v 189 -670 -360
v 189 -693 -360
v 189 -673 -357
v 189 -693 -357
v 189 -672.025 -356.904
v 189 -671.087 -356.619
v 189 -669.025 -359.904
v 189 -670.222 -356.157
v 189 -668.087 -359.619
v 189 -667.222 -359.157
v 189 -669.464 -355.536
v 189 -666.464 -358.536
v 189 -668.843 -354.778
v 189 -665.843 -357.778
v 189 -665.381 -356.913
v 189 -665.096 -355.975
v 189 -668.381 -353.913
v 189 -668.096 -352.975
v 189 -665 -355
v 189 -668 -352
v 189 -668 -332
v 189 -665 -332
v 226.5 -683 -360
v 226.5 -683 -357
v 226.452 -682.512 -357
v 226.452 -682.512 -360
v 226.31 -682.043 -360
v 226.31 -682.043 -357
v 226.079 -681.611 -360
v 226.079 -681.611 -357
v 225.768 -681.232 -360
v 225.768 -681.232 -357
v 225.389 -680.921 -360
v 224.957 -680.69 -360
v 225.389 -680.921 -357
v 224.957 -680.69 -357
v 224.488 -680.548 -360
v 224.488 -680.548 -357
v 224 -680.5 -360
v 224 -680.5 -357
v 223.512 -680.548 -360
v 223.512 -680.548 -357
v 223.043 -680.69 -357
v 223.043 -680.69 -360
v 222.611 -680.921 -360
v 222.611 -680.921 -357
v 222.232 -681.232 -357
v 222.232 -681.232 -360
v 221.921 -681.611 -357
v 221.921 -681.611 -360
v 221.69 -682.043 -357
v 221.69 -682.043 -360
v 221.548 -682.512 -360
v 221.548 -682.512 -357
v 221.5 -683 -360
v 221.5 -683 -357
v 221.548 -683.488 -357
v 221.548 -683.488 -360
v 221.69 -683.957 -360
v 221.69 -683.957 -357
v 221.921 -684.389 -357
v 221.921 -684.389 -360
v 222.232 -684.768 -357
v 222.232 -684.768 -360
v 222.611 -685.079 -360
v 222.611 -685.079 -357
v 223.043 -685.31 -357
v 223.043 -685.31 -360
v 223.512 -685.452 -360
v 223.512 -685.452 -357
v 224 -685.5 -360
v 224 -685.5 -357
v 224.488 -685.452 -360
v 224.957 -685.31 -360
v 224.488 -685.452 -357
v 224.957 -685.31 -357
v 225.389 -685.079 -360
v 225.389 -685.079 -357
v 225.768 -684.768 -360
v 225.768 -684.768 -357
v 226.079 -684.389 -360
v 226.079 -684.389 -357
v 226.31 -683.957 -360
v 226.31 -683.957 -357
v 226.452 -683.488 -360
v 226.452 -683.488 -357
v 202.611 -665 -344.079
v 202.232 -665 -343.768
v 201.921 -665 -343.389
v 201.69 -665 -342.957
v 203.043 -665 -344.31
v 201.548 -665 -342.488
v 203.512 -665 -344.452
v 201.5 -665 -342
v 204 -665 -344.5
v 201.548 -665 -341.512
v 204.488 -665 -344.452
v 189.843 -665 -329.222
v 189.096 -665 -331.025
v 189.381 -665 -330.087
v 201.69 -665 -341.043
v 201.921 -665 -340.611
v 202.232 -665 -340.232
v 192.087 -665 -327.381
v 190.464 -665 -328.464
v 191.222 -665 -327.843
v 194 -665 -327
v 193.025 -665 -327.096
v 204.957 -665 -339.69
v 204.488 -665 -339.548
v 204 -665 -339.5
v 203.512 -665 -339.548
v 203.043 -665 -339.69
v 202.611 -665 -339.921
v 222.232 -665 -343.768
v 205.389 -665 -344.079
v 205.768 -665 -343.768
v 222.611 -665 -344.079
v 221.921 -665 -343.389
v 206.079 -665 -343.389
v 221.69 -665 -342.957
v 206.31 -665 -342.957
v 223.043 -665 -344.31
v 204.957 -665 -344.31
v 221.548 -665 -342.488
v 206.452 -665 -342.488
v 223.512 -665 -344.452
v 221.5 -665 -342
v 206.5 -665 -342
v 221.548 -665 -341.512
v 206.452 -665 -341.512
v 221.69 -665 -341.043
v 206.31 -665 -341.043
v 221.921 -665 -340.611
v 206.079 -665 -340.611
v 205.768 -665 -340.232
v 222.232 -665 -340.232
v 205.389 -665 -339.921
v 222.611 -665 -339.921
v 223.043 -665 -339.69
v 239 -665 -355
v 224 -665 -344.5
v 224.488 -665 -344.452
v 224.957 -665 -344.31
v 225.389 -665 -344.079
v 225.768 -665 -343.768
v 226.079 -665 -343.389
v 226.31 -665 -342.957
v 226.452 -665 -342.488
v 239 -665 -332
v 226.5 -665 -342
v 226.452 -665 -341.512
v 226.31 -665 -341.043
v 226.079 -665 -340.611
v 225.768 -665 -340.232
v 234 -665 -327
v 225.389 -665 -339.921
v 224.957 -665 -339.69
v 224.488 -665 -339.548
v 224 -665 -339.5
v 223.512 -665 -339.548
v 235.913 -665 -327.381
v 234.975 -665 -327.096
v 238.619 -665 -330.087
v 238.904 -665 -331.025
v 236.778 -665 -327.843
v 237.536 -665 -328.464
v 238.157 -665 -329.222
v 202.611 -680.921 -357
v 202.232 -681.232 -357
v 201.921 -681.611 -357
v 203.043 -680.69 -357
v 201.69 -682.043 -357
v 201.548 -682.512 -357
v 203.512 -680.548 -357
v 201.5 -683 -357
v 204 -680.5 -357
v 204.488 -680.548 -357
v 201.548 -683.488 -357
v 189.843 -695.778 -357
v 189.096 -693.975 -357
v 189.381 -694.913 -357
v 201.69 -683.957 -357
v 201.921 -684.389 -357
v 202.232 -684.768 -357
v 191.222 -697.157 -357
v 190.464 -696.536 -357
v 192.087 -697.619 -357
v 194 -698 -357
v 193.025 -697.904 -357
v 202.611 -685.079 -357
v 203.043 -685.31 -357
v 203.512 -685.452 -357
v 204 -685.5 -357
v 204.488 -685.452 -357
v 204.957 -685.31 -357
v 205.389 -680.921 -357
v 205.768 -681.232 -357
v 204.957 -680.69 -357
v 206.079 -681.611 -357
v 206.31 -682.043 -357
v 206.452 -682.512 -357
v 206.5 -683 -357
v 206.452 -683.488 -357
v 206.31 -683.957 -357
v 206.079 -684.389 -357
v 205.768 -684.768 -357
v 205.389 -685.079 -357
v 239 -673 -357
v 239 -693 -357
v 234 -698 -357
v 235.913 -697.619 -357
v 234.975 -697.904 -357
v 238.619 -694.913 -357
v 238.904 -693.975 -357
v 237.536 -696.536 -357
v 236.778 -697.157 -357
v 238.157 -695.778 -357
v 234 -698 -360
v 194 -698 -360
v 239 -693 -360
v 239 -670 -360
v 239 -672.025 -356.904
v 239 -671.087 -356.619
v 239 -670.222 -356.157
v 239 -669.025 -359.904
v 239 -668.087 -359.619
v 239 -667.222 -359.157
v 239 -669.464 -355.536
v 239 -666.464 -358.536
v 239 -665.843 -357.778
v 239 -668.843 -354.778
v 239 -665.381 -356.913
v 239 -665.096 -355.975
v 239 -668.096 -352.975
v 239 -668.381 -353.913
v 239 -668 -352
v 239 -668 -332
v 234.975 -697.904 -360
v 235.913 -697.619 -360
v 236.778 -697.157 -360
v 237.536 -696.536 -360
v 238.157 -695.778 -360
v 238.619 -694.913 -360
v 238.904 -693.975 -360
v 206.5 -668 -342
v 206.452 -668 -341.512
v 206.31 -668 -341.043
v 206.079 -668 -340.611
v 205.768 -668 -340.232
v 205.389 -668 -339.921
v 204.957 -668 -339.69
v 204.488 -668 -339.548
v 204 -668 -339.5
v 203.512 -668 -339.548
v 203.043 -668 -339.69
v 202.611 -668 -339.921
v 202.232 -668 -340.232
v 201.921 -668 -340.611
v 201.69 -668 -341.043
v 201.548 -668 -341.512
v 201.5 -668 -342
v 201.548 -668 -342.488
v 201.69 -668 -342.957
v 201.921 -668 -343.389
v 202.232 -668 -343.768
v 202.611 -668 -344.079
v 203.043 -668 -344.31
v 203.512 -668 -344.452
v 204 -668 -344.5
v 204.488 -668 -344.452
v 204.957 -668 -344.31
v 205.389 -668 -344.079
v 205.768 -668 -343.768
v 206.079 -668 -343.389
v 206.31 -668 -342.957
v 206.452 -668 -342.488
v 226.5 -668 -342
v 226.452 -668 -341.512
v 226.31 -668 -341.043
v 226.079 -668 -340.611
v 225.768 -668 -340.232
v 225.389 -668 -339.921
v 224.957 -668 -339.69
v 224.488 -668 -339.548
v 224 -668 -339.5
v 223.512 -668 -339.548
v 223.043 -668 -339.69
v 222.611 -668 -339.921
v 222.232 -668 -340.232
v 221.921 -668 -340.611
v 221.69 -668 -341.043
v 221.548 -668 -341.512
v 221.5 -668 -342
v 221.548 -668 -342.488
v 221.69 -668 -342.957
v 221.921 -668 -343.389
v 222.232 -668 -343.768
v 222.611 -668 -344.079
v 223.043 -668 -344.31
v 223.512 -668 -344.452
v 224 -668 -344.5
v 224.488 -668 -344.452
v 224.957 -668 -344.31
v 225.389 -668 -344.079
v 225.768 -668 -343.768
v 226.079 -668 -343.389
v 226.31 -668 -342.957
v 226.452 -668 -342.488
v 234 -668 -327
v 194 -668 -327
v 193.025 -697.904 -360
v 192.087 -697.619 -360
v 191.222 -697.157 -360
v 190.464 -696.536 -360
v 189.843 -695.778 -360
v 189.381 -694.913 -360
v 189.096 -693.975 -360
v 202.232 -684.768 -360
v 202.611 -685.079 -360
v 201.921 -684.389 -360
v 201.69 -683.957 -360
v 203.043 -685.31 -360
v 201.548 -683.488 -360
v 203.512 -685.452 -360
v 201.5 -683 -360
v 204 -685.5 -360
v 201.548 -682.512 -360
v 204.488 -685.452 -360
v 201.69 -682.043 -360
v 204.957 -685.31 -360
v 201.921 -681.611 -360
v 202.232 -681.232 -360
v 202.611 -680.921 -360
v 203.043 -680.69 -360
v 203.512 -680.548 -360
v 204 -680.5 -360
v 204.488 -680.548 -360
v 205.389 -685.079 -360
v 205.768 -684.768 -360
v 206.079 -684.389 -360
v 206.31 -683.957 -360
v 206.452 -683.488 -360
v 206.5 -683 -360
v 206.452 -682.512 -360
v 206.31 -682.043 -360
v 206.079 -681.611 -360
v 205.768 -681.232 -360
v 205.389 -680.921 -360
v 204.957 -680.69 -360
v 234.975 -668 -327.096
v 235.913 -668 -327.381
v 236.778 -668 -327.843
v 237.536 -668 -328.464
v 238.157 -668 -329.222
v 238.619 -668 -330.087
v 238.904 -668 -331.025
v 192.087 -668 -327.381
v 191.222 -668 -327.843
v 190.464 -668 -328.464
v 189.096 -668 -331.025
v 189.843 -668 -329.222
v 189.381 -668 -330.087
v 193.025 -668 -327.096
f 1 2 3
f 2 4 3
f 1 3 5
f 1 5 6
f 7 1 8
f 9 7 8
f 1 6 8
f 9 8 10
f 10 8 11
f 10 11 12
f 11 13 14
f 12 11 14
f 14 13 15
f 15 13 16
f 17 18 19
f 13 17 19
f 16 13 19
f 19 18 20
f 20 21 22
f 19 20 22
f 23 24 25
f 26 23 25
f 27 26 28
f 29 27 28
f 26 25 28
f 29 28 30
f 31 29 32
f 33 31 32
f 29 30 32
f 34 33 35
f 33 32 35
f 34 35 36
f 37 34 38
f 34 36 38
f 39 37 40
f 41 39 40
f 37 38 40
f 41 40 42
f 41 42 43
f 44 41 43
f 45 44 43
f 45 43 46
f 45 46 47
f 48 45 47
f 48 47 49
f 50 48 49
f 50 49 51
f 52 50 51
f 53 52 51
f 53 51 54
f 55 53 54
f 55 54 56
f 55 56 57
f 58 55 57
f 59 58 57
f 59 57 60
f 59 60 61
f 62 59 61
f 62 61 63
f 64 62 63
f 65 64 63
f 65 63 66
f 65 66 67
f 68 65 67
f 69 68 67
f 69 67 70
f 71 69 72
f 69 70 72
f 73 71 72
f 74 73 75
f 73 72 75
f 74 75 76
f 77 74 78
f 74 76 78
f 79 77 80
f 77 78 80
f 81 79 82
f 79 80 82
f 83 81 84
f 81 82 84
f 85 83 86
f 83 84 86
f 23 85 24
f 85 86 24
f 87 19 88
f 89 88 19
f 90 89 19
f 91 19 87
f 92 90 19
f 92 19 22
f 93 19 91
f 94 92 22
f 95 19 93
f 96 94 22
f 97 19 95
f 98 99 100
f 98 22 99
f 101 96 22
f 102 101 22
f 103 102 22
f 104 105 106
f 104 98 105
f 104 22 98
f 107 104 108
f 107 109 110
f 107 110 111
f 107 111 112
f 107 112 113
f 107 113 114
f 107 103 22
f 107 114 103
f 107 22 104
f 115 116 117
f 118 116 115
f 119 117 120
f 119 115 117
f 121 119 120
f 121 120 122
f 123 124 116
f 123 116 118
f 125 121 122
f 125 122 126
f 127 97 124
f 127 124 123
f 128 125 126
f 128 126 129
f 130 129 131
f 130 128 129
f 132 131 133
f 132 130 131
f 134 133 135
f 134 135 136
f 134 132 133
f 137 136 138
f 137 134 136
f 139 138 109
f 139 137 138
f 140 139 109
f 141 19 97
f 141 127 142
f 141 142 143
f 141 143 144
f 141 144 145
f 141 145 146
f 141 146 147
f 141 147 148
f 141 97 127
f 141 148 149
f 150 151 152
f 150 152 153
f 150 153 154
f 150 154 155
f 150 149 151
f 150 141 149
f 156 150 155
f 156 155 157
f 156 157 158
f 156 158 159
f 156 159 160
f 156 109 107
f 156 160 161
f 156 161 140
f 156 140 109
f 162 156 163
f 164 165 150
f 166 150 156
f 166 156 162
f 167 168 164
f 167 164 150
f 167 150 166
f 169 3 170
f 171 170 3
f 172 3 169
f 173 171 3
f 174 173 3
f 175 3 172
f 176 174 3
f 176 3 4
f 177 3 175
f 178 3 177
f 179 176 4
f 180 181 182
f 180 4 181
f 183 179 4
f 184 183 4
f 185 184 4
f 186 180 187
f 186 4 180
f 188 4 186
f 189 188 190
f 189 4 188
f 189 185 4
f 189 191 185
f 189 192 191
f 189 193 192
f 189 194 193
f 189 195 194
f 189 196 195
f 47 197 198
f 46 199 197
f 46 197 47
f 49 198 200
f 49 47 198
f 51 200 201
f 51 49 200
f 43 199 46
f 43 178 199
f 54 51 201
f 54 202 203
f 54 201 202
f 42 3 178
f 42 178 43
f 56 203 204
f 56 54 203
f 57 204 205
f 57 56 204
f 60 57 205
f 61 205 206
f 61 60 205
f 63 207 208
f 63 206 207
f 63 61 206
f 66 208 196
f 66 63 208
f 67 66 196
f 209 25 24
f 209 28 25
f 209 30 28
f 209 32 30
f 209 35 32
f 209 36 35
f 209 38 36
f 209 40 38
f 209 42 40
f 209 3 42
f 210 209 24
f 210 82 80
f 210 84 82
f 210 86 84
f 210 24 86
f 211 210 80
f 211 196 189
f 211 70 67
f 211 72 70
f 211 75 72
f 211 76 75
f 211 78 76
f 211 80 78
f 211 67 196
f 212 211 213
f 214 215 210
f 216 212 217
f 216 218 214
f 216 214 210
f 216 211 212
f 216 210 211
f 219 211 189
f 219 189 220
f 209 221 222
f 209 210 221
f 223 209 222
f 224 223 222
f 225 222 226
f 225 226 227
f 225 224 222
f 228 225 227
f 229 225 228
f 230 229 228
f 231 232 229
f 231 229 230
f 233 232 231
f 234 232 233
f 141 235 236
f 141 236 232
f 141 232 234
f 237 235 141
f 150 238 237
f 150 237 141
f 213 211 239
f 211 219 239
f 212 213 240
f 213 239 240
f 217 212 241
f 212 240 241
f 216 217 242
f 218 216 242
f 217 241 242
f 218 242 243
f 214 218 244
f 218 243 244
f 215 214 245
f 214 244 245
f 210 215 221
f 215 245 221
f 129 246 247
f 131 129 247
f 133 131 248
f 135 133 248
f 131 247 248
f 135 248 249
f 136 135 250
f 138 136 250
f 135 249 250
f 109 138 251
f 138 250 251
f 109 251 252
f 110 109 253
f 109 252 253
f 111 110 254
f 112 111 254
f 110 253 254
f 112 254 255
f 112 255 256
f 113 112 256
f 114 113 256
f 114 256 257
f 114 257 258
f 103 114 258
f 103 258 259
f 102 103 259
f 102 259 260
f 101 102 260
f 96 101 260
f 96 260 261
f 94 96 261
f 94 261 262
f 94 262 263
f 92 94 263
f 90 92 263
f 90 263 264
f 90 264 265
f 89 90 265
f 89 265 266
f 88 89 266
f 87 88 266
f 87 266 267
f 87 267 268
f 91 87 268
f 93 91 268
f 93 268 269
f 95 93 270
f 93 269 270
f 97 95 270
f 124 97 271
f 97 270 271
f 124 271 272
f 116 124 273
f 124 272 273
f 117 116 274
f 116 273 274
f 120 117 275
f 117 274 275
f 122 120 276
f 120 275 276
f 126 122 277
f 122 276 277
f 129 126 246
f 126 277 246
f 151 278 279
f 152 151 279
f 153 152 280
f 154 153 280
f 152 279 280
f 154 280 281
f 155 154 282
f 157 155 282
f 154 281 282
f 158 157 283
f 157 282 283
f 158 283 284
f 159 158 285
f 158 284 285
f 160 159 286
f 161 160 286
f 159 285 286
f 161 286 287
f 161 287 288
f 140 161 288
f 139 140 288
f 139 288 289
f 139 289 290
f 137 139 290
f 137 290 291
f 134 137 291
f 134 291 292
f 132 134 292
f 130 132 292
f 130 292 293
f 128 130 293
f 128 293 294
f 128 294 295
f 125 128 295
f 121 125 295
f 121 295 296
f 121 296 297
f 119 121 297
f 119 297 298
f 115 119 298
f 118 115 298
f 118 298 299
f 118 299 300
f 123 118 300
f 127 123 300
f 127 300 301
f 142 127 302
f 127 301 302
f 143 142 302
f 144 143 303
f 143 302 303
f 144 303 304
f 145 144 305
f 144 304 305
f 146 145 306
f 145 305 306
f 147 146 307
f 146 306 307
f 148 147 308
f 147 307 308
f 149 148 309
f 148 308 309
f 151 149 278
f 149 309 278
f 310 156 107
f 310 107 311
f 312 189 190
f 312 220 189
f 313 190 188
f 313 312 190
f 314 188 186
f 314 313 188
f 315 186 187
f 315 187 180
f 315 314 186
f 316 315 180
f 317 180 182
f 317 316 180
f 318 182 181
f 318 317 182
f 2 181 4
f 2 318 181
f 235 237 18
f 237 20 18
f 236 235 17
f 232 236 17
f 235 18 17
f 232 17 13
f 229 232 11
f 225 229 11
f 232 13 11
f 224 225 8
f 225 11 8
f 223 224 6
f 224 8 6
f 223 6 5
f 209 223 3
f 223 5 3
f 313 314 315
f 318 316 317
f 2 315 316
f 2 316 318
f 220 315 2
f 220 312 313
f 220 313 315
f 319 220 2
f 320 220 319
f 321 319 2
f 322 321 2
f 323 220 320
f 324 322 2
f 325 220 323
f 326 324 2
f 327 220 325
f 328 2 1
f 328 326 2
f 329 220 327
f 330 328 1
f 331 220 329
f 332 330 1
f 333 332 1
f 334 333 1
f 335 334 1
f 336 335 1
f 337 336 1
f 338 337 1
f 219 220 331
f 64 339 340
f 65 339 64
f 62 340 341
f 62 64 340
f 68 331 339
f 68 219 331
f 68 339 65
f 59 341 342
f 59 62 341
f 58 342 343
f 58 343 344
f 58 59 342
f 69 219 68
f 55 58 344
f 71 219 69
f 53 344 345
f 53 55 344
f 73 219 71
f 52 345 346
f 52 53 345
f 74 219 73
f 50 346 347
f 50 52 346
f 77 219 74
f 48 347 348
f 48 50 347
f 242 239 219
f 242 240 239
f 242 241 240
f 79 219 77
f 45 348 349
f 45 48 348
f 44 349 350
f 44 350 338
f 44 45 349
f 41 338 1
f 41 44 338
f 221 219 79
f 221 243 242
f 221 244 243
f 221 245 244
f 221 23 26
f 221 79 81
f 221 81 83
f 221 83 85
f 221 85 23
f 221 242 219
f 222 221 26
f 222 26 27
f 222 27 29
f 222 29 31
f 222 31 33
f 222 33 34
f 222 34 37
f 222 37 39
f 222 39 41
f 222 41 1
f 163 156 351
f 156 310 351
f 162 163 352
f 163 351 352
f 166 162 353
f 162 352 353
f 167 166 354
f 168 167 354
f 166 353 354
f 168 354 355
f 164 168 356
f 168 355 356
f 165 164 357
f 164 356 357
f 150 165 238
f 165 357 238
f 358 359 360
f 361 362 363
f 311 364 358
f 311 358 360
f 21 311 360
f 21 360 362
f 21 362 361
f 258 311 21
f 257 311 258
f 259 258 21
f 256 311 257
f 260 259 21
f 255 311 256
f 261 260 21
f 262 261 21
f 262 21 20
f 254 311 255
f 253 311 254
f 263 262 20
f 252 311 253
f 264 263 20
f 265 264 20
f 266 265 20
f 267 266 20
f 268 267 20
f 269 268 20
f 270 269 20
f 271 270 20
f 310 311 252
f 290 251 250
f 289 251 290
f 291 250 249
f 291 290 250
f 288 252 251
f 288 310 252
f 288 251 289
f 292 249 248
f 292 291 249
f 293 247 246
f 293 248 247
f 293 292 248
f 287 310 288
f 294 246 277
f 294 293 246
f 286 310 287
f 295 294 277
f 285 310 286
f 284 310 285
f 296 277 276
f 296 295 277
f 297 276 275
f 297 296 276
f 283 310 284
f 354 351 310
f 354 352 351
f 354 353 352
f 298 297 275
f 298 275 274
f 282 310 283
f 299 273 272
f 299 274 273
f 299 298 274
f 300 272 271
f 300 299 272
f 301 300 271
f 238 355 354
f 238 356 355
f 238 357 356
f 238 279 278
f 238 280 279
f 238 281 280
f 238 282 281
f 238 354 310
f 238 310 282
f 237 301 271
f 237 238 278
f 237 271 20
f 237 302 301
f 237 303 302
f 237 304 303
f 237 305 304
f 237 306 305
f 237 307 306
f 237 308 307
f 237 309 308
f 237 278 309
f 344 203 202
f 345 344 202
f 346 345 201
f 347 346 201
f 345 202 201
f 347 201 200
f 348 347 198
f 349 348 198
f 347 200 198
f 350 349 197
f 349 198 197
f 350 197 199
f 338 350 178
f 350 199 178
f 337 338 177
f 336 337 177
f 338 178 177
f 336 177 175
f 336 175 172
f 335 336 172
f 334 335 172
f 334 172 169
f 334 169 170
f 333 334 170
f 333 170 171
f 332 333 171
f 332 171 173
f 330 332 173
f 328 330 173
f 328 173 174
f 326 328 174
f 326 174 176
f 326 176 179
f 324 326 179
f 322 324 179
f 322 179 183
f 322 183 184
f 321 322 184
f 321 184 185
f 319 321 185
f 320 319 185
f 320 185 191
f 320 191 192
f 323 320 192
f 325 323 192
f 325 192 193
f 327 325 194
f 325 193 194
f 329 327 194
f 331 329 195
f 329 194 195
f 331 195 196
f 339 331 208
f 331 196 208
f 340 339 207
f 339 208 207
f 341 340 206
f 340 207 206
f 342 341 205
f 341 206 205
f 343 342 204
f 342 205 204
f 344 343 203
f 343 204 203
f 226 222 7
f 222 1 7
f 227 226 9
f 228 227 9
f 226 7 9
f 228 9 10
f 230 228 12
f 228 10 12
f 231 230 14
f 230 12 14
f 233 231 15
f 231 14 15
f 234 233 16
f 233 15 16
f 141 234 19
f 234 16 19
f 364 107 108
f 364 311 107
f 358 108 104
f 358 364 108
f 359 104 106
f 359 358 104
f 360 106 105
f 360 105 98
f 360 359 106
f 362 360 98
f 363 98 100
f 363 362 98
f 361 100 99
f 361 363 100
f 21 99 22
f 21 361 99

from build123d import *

# Parameters (mm, degrees)
F0_W      = 145
F0_H      = 5
F1_DEPTH  = 360
F0_W_2    = 58
F0_H_2    = 655
F2_DEPTH  = 360
F0_W_3    = 155
F0_H_3    = 163
F0_H_4    = 153
F3_DEPTH  = 360
F5_DEPTH  = 665
F7_DEPTH  = 394
F9_DEPTH  = 125
F11_DEPTH = 50
F12_R     = 5
F14_R     = 2.5
F15_DEPTH = 10
F13_R     = 2.5
F16_DEPTH = 10
F18_DEPTH = 502


# Not quite as in the source:
# - a feature names something its author has since deleted; it is built from what else it names


with BuildPart() as f1:
    # F0 (on Top) → F1 (new body)
    with BuildSketch(Plane.XY):
        Polygon((5, 0), (0, 0), (0, -665), (5, -665), (5, -660), (5, -5), align=None)
        Polygon((155, 0), (5, 0), (5, -5), (150, -5), (155, -5), align=None)
        Polygon((155, -665), (155, -5), (150, -5), (150, -660), (150, -665), align=None)
        with Locations((77.5, -662.5)):
            Rectangle(F0_W, F0_H)
    extrude(amount=-F1_DEPTH)


with BuildPart() as f2:
    # F0 (on Top) → F2 (new body)
    with BuildSketch(Plane.XY):
        Polygon((239, 0), (155, 0), (155, -5), (155, -665), (239, -665), (239, -163), align=None)
        with Locations((197, -332.5)):
            Rectangle(F0_W_2, F0_H_2, mode=Mode.SUBTRACT)
    extrude(amount=-F2_DEPTH)


with BuildPart() as f3:
    # F0 (on Top) → F3 (new body)
    with BuildSketch(Plane.XY):
        with Locations((316.5, -81.5)):
            Rectangle(F0_W_3, F0_H_3)
        with Locations((316.5, -81.5)):
            Rectangle(F0_W, F0_H_4, mode=Mode.SUBTRACT)
    extrude(amount=-F3_DEPTH)


with BuildPart() as f5:
    # F4 (on face) → F5 (new body)
    with BuildSketch(Plane(origin=(0, 0, 0), x_dir=(-1, 0, 0), z_dir=(0, 1, 0))):
        Polygon((0, -330), (0, -360), (30, -360), (30, -359), (1, -359), (1, -330), align=None)
    extrude(amount=-F5_DEPTH)


with BuildPart() as f7:
    # F6 (on face) → F7 (new body)
    with BuildSketch(Plane.YZ.offset(394)):
        Polygon((0, -330), (0, -360), (30, -360), (30, -359), (1, -359), (1, -330), align=None)
    extrude(amount=-F7_DEPTH)


with BuildPart() as f9:
    # F8 (on face) → F9 (new body)
    with BuildSketch(Plane.YZ.offset(394)):
        Polygon((-193, -360), (-163, -360), (-163, -330), (-164, -330), (-164, -359), (-193, -359), align=None)
    extrude(amount=-F9_DEPTH)


with BuildPart() as f11:
    # F10 (on face) → F11 (new body)
    with BuildSketch(Plane.YZ.offset(239)):
        Polygon((-698, -360), (-665, -360), (-665, -327), (-668, -327), (-668, -357), (-698, -357), align=None)
    extrude(amount=-F11_DEPTH)

    # F12
    f12_edges = [f11.edges().sort_by_distance(p)[0] for p in [
        (214, -668, -357),
        (189, -666.5, -327),
        (239, -666.5, -327),
        (239, -698, -358.5),
        (189, -698, -358.5),
        (214, -665, -360),
    ]]
    fillet(f12_edges, radius=F12_R)


with BuildPart() as f15_tool:
    # F14 (on face) → F15 (new body)
    with BuildSketch(Plane.XZ.offset(668)):
        with Locations((204, -342)):
            Circle(F14_R)
        with Locations((224, -342)):
            Circle(F14_R)
    extrude(amount=-F15_DEPTH)


with BuildPart() as f2_1:
    add(f2.part)

    # F15: cut by f15_tool
    add(f15_tool.part, mode=Mode.SUBTRACT)


with BuildPart() as f11_1:
    add(f11.part)

    # F15: cut by f15_tool
    add(f15_tool.part, mode=Mode.SUBTRACT)

    # F13 (on face) → F16 (cut)
    with BuildSketch(Plane.XY.offset(-357)):
        with Locations((204, -683)):
            Circle(F13_R)
        with Locations((224, -683)):
            Circle(F13_R)
    extrude(amount=-F16_DEPTH, mode=Mode.SUBTRACT)


with BuildPart() as f18:
    # F17 (on face) → F18 (new body)
    with BuildSketch(Plane.XZ.offset(665)):
        Polygon((242, -330), (239, -330), (239, -360), (269, -360), (269, -357), (242, -357), align=None)
    extrude(amount=-F18_DEPTH)


solid = f11_1.part
